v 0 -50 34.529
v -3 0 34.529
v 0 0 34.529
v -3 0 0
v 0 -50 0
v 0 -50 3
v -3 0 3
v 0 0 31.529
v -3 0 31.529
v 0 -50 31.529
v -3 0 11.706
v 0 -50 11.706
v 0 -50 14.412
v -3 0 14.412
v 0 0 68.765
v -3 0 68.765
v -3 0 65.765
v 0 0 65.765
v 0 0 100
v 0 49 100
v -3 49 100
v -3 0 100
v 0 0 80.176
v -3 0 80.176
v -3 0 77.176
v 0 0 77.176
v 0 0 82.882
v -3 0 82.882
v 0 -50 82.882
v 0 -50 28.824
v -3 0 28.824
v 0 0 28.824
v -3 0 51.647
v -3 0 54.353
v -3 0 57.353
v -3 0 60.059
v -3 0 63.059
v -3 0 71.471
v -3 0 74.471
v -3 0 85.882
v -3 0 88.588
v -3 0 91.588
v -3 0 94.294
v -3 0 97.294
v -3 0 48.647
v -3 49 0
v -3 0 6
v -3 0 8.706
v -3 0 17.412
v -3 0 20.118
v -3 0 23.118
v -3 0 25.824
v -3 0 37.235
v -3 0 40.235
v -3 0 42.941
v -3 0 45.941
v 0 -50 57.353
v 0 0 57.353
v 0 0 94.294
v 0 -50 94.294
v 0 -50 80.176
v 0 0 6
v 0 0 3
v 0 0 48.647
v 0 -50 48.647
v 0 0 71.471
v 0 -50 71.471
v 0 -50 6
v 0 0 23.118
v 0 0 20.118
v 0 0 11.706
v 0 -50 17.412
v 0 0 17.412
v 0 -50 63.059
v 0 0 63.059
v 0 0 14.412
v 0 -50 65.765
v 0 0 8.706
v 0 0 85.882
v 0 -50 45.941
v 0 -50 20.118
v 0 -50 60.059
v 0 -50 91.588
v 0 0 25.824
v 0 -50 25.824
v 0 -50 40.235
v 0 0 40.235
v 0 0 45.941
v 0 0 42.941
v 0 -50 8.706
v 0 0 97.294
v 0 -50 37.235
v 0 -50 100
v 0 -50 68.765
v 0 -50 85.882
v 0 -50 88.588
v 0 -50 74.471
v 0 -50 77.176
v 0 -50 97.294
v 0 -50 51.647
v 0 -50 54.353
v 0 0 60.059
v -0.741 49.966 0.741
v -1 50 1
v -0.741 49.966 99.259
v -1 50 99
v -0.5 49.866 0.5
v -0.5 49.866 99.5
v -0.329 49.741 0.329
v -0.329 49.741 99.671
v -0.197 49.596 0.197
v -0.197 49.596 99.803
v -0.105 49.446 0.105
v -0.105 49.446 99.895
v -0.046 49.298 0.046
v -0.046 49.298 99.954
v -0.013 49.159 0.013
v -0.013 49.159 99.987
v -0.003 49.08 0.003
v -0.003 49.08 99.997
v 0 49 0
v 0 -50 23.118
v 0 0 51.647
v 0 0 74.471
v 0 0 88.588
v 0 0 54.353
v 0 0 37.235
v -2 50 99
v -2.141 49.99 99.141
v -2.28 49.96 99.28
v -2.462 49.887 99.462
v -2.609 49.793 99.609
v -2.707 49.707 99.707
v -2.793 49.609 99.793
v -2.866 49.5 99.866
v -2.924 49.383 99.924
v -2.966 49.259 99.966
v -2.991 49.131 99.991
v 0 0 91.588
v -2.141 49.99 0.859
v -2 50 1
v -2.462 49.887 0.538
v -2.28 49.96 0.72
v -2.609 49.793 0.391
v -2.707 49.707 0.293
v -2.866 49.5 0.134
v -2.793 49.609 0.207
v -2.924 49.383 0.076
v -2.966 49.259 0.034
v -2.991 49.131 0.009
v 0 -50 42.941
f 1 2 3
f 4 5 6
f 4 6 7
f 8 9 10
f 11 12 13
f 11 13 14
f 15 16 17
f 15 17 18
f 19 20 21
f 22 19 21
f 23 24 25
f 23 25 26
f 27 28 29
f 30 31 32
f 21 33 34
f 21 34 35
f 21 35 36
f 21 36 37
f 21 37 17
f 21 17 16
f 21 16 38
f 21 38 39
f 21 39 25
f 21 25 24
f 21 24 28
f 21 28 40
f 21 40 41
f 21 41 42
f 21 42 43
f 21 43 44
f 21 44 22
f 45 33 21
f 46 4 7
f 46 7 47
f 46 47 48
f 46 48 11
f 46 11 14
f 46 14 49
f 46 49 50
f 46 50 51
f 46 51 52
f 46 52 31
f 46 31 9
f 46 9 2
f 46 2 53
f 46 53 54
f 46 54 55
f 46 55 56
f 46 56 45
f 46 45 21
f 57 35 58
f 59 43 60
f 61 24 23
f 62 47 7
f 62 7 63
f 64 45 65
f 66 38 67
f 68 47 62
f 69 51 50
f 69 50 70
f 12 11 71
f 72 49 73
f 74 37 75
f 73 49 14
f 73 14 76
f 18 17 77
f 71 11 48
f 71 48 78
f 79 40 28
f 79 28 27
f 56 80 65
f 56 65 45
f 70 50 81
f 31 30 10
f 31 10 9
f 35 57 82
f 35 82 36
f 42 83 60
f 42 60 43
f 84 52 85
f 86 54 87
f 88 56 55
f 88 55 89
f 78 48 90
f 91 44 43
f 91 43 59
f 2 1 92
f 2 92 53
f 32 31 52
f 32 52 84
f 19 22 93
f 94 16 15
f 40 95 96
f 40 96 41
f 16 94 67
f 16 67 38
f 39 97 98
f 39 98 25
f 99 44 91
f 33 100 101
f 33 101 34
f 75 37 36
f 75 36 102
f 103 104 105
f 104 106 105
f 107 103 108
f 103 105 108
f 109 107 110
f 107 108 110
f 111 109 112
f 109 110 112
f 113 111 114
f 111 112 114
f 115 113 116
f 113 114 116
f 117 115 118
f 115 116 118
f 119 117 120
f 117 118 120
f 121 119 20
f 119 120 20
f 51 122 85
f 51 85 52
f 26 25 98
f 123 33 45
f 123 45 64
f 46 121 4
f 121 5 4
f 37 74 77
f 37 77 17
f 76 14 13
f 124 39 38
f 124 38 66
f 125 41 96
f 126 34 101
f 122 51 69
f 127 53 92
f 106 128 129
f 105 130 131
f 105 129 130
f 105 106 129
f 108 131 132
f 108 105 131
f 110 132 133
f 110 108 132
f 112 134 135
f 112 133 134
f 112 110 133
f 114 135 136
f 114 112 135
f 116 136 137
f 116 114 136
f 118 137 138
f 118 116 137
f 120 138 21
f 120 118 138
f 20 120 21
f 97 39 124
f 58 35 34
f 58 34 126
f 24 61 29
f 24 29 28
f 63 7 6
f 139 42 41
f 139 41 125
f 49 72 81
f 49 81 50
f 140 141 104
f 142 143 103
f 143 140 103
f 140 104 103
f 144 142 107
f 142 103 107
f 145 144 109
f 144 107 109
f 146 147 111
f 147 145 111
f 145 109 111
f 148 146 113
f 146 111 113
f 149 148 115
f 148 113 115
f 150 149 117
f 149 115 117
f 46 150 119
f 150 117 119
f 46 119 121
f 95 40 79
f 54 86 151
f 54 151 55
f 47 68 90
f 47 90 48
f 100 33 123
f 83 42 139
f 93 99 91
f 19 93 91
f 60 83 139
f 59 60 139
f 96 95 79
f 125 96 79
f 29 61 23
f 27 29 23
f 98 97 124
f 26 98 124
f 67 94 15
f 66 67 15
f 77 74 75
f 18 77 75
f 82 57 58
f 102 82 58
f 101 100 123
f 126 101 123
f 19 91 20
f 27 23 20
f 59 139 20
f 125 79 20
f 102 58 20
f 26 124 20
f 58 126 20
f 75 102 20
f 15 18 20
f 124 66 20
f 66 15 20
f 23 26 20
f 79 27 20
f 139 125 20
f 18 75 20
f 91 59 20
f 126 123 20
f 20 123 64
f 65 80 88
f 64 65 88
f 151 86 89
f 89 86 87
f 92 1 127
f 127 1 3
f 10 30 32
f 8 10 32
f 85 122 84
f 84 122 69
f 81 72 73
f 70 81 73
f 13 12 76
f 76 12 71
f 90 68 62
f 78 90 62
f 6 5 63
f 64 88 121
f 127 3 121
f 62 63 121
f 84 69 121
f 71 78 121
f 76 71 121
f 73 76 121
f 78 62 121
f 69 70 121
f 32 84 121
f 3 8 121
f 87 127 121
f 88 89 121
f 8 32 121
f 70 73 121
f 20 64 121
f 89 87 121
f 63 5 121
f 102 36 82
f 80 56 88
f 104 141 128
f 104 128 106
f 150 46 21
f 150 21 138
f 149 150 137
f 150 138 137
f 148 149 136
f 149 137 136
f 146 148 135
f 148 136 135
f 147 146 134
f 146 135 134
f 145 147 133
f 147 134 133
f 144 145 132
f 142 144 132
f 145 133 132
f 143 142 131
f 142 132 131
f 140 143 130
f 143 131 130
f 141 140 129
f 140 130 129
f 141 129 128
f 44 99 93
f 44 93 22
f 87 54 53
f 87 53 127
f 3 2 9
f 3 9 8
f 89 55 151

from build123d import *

# Parameters (mm, degrees)
PAD_DEPTH           = 100
SKETCH001_W         = 40
SKETCH001_H         = 3
POCKET_DEPTH        = 60
LINEARPATTERN_COUNT = 18
LINEARPATTERN_PITCH = 5.705882
FILLET_R            = 1


with BuildPart() as part:
    # Sketch → Pad (new body)
    with BuildSketch(Plane.XY):
        Polygon((-3, 0), (-3, 50), (0, 50), (0, 0), (0, -50), align=None)
    extrude(amount=PAD_DEPTH)

    # Sketch001 → Pocket (cut)
    with BuildSketch(Plane.XZ):
        with Locations((-0.275086, 4.5)):
            Rectangle(SKETCH001_W, SKETCH001_H)
    pocket = extrude(amount=POCKET_DEPTH, mode=Mode.SUBTRACT)

    # LinearPattern: Pocket ×18
    with Locations(*[(0, 0, i * LINEARPATTERN_PITCH) for i in range(1, LINEARPATTERN_COUNT)]):
        add(pocket, mode=Mode.SUBTRACT)

    # Fillet
    fillet_edges = [part.edges().sort_by_distance(p)[0] for p in [
        (-3, 50, 50),
        (0, 50, 50),
        (-1.5, 50, 0),
        (-1.5, 50, 100),
    ]]
    fillet(fillet_edges, radius=FILLET_R)


solid = part.part
